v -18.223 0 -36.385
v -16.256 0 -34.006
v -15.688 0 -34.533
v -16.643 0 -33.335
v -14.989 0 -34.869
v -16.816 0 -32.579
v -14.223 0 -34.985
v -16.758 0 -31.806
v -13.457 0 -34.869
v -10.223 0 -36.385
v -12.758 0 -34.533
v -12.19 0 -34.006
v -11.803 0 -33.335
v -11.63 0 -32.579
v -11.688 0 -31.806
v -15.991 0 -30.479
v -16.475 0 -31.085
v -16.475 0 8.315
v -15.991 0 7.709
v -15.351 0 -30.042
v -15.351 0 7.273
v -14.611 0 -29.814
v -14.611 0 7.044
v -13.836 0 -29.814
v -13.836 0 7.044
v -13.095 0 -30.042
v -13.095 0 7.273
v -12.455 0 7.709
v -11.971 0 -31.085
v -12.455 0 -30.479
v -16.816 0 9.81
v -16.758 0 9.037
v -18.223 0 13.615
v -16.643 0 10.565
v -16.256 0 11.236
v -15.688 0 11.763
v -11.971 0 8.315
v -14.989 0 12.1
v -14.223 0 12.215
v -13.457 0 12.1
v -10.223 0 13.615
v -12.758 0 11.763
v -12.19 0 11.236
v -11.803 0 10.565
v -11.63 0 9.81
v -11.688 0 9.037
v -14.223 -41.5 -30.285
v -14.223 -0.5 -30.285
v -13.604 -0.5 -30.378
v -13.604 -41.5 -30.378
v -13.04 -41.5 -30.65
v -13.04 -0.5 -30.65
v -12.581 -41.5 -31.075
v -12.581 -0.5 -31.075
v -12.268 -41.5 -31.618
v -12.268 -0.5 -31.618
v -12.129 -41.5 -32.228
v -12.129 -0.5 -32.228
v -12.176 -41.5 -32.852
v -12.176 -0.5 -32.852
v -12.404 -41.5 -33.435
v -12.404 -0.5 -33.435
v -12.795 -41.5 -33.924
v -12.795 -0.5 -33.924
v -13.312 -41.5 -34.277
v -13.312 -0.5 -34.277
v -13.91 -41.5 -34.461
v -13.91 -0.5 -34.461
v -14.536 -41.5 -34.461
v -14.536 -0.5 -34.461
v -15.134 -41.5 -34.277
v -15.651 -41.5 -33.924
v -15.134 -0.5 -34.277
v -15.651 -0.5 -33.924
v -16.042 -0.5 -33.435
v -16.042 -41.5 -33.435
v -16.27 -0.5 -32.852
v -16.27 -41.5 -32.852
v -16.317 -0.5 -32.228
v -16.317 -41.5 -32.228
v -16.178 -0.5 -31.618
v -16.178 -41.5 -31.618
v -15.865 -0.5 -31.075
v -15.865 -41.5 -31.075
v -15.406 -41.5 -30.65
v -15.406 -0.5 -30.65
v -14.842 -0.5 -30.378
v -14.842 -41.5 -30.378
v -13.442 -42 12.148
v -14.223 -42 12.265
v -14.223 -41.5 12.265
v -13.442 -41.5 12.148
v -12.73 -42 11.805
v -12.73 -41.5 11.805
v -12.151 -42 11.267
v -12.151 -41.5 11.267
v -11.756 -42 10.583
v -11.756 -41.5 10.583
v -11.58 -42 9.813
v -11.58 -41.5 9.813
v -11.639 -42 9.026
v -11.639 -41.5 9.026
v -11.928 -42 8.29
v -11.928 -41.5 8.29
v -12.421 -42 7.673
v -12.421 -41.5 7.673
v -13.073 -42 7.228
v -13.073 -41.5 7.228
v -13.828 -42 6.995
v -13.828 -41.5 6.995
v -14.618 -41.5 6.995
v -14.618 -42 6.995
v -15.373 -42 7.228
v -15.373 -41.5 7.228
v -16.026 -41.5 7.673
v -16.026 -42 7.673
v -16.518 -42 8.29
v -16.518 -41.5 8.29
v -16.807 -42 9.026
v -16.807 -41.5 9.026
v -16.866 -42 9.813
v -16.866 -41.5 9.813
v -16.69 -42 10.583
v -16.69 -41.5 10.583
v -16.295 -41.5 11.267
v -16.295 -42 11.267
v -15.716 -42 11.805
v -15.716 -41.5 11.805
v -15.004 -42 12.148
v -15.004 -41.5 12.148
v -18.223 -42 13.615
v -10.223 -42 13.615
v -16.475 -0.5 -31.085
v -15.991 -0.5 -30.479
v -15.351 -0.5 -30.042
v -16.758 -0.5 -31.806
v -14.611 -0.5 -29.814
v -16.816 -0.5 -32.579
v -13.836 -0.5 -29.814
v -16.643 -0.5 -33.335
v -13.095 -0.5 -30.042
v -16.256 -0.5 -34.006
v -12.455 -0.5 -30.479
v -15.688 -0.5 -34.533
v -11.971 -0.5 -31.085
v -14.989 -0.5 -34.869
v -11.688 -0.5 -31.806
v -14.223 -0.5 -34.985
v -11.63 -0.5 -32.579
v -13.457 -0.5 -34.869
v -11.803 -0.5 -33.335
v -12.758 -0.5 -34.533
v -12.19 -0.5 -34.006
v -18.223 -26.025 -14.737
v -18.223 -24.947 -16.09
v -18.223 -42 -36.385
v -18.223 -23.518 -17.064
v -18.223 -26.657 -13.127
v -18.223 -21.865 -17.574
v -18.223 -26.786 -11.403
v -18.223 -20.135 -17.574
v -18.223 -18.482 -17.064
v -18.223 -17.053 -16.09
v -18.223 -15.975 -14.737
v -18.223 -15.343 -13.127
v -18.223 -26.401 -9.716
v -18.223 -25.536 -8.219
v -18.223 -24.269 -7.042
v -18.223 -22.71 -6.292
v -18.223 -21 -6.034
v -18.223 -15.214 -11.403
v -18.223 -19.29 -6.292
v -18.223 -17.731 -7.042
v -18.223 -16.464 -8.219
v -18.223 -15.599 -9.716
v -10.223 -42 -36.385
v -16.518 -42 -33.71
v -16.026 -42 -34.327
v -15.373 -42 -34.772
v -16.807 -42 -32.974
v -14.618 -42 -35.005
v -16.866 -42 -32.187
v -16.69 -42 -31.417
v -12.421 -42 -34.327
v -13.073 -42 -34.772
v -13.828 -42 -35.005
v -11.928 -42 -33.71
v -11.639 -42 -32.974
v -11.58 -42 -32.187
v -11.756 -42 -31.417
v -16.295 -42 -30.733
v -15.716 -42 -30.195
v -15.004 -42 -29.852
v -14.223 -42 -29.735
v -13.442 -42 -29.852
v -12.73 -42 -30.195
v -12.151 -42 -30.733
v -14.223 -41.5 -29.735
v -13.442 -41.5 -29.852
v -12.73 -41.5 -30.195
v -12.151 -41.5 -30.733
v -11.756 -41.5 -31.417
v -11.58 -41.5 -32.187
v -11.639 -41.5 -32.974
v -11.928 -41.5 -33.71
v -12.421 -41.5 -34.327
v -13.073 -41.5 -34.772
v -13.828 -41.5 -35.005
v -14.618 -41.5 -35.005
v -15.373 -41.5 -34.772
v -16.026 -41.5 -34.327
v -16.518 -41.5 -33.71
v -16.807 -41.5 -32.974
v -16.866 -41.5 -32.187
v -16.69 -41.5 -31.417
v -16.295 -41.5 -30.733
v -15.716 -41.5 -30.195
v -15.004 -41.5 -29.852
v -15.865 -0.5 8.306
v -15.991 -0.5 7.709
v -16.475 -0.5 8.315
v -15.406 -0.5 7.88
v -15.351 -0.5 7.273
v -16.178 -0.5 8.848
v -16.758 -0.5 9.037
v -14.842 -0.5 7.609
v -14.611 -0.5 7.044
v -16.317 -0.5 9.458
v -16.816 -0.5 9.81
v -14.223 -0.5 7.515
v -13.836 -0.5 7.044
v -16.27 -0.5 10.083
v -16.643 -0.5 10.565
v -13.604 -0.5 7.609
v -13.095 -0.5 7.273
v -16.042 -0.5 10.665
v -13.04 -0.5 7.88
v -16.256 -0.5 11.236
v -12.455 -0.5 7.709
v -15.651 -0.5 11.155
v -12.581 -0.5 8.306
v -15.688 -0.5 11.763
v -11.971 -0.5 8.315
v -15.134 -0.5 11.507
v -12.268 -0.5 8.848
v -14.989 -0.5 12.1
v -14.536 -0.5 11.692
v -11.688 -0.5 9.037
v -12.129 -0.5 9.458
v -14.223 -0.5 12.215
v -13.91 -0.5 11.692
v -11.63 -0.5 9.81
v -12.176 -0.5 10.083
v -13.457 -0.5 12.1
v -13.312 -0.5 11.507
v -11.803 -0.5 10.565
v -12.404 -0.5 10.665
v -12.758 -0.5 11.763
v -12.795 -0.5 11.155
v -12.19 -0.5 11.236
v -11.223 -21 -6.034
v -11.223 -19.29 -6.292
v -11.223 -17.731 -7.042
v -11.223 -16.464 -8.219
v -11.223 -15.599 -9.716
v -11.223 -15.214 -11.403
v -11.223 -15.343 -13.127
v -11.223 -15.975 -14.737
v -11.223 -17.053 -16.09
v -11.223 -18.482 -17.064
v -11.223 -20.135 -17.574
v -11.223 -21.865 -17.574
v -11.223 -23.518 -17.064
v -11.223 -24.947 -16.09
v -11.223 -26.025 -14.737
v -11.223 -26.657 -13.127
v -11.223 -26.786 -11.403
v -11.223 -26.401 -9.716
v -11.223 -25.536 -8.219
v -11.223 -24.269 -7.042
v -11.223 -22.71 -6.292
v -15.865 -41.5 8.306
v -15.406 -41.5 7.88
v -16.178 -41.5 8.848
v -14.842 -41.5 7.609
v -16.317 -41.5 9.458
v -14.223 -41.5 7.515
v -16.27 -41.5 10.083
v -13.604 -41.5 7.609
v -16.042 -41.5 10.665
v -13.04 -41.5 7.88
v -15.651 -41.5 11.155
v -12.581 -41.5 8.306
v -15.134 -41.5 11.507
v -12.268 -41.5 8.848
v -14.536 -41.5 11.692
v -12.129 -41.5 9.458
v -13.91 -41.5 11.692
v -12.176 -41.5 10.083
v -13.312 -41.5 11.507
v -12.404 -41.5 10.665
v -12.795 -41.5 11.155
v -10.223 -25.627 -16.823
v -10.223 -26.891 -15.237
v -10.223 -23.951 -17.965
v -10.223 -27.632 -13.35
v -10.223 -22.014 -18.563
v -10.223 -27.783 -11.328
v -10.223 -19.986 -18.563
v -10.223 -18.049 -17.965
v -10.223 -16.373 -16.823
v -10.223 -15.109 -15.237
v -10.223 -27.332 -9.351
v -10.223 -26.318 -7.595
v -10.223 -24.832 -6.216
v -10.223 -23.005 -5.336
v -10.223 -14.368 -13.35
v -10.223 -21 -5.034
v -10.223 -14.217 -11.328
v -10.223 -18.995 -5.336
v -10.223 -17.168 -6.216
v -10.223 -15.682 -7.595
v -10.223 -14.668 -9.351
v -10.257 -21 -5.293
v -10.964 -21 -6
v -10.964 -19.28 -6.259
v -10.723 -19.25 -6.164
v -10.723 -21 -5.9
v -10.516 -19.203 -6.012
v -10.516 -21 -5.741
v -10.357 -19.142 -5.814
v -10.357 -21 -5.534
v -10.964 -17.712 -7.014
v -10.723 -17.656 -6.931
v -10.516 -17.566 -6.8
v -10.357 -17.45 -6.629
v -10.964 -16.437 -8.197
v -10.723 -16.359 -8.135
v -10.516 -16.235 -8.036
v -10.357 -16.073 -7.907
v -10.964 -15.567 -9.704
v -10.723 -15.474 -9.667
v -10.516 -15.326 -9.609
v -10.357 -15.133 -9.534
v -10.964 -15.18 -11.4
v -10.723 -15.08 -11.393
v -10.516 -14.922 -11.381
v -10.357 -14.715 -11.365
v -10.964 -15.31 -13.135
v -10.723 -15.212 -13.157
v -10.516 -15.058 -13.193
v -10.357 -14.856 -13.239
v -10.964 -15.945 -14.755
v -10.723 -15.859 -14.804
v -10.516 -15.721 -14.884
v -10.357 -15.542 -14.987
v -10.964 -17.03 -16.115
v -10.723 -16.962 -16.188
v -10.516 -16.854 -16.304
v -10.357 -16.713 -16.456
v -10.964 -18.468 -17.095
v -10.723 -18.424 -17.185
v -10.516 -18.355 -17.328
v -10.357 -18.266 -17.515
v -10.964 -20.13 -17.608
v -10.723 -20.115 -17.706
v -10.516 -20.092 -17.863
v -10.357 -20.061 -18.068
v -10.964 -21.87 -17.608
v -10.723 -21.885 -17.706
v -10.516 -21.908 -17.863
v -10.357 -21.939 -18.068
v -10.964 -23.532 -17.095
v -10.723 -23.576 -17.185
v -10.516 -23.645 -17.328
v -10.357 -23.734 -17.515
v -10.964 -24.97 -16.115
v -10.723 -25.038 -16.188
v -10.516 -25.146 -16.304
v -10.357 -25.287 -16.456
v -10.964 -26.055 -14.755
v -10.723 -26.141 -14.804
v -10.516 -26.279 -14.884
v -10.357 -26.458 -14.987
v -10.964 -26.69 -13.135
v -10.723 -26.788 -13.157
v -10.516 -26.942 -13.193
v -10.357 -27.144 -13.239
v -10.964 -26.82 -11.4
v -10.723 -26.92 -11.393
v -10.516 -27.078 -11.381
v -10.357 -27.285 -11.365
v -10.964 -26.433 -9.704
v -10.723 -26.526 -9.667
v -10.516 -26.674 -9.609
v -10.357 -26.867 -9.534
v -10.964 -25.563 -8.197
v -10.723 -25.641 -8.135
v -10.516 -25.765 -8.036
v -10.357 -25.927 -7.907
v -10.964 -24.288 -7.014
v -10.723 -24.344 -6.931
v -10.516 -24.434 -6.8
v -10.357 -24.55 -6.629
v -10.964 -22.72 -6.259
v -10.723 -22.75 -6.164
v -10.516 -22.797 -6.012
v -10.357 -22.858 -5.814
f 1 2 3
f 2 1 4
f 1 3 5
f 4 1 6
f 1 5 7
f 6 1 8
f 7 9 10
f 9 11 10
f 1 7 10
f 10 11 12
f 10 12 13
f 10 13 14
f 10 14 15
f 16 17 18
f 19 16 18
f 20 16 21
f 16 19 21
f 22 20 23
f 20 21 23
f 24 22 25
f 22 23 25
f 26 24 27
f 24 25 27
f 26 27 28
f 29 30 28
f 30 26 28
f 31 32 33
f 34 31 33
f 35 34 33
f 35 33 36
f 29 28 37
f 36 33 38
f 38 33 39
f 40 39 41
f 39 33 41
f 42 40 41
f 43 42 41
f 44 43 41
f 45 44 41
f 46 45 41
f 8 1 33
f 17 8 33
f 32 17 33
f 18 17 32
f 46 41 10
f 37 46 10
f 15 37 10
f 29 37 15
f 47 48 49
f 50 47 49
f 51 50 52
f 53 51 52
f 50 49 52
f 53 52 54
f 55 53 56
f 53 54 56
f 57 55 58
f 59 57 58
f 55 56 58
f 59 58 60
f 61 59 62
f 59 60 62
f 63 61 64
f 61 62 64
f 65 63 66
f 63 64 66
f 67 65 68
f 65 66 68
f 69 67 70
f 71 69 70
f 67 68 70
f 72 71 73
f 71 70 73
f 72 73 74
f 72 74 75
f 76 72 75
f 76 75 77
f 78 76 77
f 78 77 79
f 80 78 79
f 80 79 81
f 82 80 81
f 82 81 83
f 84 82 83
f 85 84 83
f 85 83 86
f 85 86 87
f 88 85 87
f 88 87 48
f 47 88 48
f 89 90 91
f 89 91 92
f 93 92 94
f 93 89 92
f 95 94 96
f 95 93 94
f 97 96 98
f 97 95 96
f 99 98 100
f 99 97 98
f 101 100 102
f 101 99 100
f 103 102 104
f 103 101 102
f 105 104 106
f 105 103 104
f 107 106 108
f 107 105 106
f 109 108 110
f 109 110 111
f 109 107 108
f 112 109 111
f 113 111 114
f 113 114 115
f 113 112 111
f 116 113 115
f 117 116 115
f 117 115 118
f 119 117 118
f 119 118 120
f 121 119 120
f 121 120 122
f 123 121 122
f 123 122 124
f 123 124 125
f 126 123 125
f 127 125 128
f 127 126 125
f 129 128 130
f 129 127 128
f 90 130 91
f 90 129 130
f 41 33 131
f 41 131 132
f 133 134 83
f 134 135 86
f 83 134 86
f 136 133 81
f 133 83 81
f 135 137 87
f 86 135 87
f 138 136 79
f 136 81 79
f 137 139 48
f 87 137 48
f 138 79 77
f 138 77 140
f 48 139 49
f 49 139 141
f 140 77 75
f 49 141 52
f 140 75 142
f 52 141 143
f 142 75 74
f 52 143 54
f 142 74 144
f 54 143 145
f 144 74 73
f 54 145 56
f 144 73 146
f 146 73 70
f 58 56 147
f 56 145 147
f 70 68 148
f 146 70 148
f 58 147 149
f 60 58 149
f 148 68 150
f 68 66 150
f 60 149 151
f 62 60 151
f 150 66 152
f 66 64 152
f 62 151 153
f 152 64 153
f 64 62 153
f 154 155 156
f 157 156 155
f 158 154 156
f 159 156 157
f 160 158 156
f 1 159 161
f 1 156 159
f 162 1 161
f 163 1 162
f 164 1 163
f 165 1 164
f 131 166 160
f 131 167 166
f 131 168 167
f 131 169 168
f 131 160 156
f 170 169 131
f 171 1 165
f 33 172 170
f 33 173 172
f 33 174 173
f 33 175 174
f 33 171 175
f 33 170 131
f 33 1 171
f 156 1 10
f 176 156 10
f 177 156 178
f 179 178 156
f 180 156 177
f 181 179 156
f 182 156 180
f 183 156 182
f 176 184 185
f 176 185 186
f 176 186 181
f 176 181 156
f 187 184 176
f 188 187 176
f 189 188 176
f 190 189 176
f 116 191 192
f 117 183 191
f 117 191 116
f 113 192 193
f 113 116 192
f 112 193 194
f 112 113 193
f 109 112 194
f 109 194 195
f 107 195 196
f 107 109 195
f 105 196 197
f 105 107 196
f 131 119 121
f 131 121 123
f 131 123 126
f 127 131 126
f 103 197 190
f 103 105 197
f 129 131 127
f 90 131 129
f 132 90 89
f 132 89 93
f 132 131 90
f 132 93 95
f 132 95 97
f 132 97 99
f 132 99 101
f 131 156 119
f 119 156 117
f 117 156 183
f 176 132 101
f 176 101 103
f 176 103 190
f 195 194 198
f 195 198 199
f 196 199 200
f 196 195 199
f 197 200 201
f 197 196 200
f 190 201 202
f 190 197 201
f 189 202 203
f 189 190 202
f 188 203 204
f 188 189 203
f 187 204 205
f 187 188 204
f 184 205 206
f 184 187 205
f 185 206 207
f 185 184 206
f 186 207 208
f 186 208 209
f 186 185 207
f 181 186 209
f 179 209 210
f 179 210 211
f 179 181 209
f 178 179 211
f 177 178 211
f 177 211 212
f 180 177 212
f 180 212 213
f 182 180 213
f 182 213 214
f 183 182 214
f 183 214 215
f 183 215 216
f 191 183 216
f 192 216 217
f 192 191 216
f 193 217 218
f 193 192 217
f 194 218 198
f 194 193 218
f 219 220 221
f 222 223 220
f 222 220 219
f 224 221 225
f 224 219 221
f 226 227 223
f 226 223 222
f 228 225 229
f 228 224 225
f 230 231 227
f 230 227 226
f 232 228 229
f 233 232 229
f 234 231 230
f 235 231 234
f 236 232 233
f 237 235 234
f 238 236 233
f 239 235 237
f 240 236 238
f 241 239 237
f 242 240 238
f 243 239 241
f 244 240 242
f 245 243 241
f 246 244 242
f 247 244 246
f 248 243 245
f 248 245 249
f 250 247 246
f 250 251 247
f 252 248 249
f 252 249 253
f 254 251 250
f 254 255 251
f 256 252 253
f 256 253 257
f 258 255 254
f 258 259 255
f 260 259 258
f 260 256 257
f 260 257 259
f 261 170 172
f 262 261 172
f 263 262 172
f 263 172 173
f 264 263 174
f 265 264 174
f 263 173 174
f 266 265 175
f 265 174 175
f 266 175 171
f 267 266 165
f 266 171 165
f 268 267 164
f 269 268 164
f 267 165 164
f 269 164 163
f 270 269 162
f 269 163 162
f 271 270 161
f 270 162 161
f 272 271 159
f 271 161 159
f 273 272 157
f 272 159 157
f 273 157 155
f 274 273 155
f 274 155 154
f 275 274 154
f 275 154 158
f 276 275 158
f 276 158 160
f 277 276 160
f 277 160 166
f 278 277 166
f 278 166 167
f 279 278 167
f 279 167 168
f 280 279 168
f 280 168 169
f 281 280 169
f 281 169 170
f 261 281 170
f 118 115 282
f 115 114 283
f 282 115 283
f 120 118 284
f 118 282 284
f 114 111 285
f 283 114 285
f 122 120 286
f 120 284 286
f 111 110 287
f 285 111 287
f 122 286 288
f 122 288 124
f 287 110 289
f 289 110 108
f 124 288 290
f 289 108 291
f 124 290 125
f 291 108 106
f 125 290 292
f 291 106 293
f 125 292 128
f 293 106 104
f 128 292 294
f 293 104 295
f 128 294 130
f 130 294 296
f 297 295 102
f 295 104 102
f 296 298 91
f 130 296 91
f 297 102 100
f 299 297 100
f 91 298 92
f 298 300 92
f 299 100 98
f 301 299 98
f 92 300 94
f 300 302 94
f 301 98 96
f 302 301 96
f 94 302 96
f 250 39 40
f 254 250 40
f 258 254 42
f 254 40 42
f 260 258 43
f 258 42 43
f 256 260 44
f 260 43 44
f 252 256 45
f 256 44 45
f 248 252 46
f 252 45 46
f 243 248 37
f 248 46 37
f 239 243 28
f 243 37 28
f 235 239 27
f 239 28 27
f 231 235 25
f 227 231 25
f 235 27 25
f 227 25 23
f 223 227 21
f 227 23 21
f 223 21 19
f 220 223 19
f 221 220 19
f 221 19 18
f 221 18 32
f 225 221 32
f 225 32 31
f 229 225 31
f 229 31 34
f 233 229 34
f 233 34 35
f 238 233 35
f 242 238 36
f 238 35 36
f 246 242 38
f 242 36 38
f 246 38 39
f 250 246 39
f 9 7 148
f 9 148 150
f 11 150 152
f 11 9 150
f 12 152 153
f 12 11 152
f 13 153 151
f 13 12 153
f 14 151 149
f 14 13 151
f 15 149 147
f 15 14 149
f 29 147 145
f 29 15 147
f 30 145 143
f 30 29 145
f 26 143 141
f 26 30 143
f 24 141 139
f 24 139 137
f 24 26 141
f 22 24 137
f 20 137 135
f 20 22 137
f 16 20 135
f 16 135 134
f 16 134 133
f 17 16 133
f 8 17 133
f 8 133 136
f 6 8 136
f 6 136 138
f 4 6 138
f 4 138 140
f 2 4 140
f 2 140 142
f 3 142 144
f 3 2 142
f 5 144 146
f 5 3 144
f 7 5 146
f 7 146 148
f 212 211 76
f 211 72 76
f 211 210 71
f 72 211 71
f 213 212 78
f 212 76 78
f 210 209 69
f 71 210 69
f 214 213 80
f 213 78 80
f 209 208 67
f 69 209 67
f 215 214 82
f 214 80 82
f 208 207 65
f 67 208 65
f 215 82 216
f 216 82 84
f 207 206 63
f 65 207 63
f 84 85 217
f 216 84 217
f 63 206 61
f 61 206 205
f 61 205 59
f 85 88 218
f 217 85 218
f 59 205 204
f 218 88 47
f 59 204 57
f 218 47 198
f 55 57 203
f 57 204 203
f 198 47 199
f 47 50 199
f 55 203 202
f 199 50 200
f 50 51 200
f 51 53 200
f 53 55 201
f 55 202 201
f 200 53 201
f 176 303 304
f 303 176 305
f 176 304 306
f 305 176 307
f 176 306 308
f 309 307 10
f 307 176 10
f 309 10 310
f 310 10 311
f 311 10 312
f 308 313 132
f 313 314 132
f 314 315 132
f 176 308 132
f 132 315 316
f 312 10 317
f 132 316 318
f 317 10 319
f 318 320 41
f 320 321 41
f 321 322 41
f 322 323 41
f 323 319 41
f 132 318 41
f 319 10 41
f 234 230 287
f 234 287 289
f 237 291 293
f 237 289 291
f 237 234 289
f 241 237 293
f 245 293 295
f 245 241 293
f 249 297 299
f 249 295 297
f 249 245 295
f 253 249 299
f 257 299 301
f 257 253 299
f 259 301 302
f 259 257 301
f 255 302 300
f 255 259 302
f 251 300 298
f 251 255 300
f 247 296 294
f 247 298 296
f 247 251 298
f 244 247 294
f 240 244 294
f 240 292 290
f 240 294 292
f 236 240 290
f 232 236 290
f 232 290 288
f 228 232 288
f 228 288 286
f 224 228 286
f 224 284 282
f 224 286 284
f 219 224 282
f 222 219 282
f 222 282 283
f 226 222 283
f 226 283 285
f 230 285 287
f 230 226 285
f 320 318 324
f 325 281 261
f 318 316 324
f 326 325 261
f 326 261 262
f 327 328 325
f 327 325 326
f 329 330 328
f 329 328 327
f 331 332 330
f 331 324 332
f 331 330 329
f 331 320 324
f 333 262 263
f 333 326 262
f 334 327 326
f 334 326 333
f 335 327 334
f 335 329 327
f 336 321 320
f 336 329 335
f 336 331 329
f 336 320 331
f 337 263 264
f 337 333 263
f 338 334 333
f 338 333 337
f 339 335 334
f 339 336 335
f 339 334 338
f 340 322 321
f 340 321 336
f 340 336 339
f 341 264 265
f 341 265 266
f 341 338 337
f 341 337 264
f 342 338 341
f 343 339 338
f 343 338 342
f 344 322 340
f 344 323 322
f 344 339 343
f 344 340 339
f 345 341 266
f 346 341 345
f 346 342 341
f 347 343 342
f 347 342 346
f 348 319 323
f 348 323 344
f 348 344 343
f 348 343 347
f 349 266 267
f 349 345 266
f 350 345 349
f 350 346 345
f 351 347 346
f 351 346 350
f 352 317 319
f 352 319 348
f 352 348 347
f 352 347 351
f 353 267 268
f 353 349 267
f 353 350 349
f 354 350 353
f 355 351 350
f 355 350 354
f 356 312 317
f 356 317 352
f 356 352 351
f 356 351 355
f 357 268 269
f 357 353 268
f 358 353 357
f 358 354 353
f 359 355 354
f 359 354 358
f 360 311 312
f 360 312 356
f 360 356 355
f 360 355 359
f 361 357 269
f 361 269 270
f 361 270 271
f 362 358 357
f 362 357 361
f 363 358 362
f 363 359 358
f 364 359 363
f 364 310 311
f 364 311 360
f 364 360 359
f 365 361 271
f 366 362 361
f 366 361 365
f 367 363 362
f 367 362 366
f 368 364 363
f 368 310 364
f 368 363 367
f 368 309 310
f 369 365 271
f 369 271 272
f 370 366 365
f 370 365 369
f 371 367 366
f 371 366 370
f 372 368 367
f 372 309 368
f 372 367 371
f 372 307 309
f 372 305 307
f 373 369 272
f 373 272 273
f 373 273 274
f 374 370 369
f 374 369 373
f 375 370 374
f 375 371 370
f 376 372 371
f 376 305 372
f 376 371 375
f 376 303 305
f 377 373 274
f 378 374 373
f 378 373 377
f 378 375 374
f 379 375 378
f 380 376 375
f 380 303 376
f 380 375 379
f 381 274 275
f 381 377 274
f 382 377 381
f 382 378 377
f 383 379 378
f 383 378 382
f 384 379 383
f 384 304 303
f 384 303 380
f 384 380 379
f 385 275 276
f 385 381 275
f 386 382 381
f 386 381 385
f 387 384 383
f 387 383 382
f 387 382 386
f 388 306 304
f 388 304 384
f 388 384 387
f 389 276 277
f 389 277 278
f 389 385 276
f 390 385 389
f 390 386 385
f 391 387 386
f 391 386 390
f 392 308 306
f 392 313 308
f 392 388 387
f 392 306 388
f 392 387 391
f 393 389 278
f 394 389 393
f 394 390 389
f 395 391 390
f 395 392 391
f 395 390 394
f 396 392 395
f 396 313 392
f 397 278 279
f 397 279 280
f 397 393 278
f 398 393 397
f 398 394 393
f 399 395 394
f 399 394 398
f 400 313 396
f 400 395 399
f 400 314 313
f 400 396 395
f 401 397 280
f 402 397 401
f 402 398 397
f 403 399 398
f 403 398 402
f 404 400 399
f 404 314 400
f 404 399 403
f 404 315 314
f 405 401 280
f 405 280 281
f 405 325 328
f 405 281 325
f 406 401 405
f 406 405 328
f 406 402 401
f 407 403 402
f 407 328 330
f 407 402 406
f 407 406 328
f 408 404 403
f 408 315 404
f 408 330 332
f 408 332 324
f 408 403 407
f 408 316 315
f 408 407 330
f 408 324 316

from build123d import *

# Parameters (mm, degrees)
SKETCH1_W           = 25
SKETCH1_H           = 50
SKETCH1_R           = 3.4
BOSS_EXTRUDE1_DEPTH = 3
SKETCH2_W           = 50
SKETCH2_H           = 3
BOSS_EXTRUDE2_DEPTH = 8
SKETCH3_W           = 8
SKETCH3_H           = 50
BOSS_EXTRUDE3_DEPTH = 42
SKETCH4_R           = 2.65
CUT_EXTRUDE1_DEPTH  = 0.5
SKETCH5_R           = 5.802370205
CUT_EXTRUDE2_DEPTH  = 9
FILLET2_R           = 1
SKETCH6_R           = 12.6
BOSS_EXTRUDE4_DEPTH = 2
FILLET4_R           = 1
SKETCH8_R           = 1.589780168
SKETCH8_R_2         = 1.777428262
CUT_EXTRUDE3_DEPTH  = 10
SKETCH9_W           = 49.021678163
SKETCH9_H           = 20.976854622
CUT_EXTRUDE4_DEPTH  = 68.79439129
SKETCH11_R          = 2.1
CUT_EXTRUDE5_DEPTH  = 59.480168703
SKETCH14_R          = 2.6
CUT_EXTRUDE6_DEPTH  = 0.5


with BuildPart() as part:
    # Sketch1 → Boss-Extrude1 (new body)
    with BuildSketch(Plane(origin=(0, 0, 0), x_dir=(1, 0, 0), z_dir=(0, 1, 0))):
        with Locations((2.276951673, 11.384758364)):
            Rectangle(SKETCH1_W, SKETCH1_H)
        with Locations(Location((1.276951673, 11.384758364, 0), (0, 0, 270))):
            Circle(SKETCH1_R, mode=Mode.SUBTRACT)
    extrude(amount=BOSS_EXTRUDE1_DEPTH)

    # Sketch2 → Boss-Extrude2 (add)
    with BuildSketch(Plane.ZY.offset(10.223048327)):
        with Locations((-11.384758364, 1.5)):
            Rectangle(SKETCH2_W, SKETCH2_H)
    extrude(amount=BOSS_EXTRUDE2_DEPTH)

    # Sketch3 → Boss-Extrude3 (add)
    with BuildSketch(Plane.XZ):
        with Locations((-14.223048327, -11.384758364)):
            Rectangle(SKETCH3_W, SKETCH3_H)
    extrude(amount=BOSS_EXTRUDE3_DEPTH)

    # Sketch4 → Cut-Extrude1 (cut)
    with BuildSketch(Plane(origin=(0, 3, 0), x_dir=(1, 0, 0), z_dir=(0, 1, 0))):
        with Locations(Location((-14.223048327, 32.384758364, 0), (0, 0, 270))):
            Circle(SKETCH4_R)
        with Locations(Location((-14.223048327, -9.615241636, 0), (0, 0, 270))):
            Circle(SKETCH4_R)
    cut_extrude1 = extrude(amount=-CUT_EXTRUDE1_DEPTH, mode=Mode.SUBTRACT)

    # Mirror1: Cut-Extrude1 across plane
    add(cut_extrude1.mirror(Plane.ZX.offset(-19.5)), mode=Mode.SUBTRACT)

    # Sketch5 → Cut-Extrude2 (cut)
    with BuildSketch(Plane.ZY.offset(18.223048327)):
        with Locations((-11.836279124, -21)):
            Circle(SKETCH5_R)
    extrude(amount=-CUT_EXTRUDE2_DEPTH, mode=Mode.SUBTRACT)

    # Fillet2
    fillet2_edges = [part.edges().sort_by_distance(p)[0] for p in [
        (-10.223048327, -21, -17.638649329),
    ]]
    fillet(fillet2_edges, radius=FILLET2_R)

    # Mirror2: Cut-Extrude1 across plane
    add(cut_extrude1.mirror(Plane.ZY.offset(1.723048327)), mode=Mode.SUBTRACT)

    # Sketch6 → Boss-Extrude4 (add)
    with BuildSketch(Plane(origin=(0, 3, 0), x_dir=(1, 0, 0), z_dir=(0, 1, 0))):
        with BuildLine():
            Line((14.776951673, 5.825082115), (14.776951673, 16.944434614))
            ThreePointArc((14.776951673, 16.944434614), (-13.323048327, 11.384758364), (14.776951673, 5.825082115))
        make_face()
        with Locations(Location((1.276951673, 11.384758364, 0), (0, 0, 270))):
            Circle(SKETCH6_R, mode=Mode.SUBTRACT)
    extrude(amount=BOSS_EXTRUDE4_DEPTH)

    # Fillet4
    # the kernel refuses this fillet: 1 mm, written as the material it takes off along each edge
    with BuildSketch(Plane(origin=(14.776951673, 5, -3.325082115), x_dir=(0, -1, 0), z_dir=(0, 0, -1))) as fillet4_piece_1:
        with BuildLine():
            CenterArc((FILLET4_R, FILLET4_R), FILLET4_R, 180, 90)
            Line((0, FILLET4_R), (0, 0))
            Line((0, 0), (FILLET4_R, 0))
        make_face()
    extrude(amount=16.119352499, mode=Mode.SUBTRACT)

    # Sketch8 → Cut-Extrude3 (cut)
    with BuildSketch(Plane(origin=(0, 3, 0), x_dir=(1, 0, 0), z_dir=(0, 1, 0))):
        with Locations(Location((1.276951673, 19.884758364, 0), (0, 0, 270))):
            Circle(SKETCH8_R)
        with Locations(Location((1.276951673, 2.884758364, 0), (0, 0, 270))):
            Circle(SKETCH8_R_2)
    extrude(amount=-CUT_EXTRUDE3_DEPTH, mode=Mode.SUBTRACT)

    # Sketch9 → Cut-Extrude4 (cut, through all)
    with BuildSketch(Plane.XY.offset(13.615241636)):
        with Locations((-9.733887409, 10.488427311)):
            Rectangle(SKETCH9_W, SKETCH9_H)
    extrude(amount=-CUT_EXTRUDE4_DEPTH, mode=Mode.SUBTRACT)

    # Sketch11 → Cut-Extrude5 (cut, through all)
    with BuildSketch(Plane(origin=(0, 0, 0), x_dir=(1, 0, 0), z_dir=(0, 1, 0))):
        with Locations(Location((-14.223048327, 32.384758364, 0), (0, 0, 270))):
            Circle(SKETCH11_R)
    cut_extrude5 = extrude(amount=-CUT_EXTRUDE5_DEPTH, mode=Mode.SUBTRACT)

    # Mirror3: Cut-Extrude5 across plane
    add(cut_extrude5.mirror(Plane.XY.offset(-11.384758364)), mode=Mode.SUBTRACT)

    # Sketch14 → Cut-Extrude6 (cut)
    with BuildSketch(Plane(origin=(0, 0, 0), x_dir=(1, 0, 0), z_dir=(0, 1, 0))):
        with Locations(Location((-14.223048327, -9.615241636, 0), (0, 0, 270))):
            Circle(SKETCH14_R)
    cut_extrude6 = extrude(amount=-CUT_EXTRUDE6_DEPTH, mode=Mode.SUBTRACT)

    # Mirror4: Cut-Extrude6 across plane
    add(cut_extrude6.mirror(Plane.XY.offset(-11.384758364)), mode=Mode.SUBTRACT)


solid = part.part
